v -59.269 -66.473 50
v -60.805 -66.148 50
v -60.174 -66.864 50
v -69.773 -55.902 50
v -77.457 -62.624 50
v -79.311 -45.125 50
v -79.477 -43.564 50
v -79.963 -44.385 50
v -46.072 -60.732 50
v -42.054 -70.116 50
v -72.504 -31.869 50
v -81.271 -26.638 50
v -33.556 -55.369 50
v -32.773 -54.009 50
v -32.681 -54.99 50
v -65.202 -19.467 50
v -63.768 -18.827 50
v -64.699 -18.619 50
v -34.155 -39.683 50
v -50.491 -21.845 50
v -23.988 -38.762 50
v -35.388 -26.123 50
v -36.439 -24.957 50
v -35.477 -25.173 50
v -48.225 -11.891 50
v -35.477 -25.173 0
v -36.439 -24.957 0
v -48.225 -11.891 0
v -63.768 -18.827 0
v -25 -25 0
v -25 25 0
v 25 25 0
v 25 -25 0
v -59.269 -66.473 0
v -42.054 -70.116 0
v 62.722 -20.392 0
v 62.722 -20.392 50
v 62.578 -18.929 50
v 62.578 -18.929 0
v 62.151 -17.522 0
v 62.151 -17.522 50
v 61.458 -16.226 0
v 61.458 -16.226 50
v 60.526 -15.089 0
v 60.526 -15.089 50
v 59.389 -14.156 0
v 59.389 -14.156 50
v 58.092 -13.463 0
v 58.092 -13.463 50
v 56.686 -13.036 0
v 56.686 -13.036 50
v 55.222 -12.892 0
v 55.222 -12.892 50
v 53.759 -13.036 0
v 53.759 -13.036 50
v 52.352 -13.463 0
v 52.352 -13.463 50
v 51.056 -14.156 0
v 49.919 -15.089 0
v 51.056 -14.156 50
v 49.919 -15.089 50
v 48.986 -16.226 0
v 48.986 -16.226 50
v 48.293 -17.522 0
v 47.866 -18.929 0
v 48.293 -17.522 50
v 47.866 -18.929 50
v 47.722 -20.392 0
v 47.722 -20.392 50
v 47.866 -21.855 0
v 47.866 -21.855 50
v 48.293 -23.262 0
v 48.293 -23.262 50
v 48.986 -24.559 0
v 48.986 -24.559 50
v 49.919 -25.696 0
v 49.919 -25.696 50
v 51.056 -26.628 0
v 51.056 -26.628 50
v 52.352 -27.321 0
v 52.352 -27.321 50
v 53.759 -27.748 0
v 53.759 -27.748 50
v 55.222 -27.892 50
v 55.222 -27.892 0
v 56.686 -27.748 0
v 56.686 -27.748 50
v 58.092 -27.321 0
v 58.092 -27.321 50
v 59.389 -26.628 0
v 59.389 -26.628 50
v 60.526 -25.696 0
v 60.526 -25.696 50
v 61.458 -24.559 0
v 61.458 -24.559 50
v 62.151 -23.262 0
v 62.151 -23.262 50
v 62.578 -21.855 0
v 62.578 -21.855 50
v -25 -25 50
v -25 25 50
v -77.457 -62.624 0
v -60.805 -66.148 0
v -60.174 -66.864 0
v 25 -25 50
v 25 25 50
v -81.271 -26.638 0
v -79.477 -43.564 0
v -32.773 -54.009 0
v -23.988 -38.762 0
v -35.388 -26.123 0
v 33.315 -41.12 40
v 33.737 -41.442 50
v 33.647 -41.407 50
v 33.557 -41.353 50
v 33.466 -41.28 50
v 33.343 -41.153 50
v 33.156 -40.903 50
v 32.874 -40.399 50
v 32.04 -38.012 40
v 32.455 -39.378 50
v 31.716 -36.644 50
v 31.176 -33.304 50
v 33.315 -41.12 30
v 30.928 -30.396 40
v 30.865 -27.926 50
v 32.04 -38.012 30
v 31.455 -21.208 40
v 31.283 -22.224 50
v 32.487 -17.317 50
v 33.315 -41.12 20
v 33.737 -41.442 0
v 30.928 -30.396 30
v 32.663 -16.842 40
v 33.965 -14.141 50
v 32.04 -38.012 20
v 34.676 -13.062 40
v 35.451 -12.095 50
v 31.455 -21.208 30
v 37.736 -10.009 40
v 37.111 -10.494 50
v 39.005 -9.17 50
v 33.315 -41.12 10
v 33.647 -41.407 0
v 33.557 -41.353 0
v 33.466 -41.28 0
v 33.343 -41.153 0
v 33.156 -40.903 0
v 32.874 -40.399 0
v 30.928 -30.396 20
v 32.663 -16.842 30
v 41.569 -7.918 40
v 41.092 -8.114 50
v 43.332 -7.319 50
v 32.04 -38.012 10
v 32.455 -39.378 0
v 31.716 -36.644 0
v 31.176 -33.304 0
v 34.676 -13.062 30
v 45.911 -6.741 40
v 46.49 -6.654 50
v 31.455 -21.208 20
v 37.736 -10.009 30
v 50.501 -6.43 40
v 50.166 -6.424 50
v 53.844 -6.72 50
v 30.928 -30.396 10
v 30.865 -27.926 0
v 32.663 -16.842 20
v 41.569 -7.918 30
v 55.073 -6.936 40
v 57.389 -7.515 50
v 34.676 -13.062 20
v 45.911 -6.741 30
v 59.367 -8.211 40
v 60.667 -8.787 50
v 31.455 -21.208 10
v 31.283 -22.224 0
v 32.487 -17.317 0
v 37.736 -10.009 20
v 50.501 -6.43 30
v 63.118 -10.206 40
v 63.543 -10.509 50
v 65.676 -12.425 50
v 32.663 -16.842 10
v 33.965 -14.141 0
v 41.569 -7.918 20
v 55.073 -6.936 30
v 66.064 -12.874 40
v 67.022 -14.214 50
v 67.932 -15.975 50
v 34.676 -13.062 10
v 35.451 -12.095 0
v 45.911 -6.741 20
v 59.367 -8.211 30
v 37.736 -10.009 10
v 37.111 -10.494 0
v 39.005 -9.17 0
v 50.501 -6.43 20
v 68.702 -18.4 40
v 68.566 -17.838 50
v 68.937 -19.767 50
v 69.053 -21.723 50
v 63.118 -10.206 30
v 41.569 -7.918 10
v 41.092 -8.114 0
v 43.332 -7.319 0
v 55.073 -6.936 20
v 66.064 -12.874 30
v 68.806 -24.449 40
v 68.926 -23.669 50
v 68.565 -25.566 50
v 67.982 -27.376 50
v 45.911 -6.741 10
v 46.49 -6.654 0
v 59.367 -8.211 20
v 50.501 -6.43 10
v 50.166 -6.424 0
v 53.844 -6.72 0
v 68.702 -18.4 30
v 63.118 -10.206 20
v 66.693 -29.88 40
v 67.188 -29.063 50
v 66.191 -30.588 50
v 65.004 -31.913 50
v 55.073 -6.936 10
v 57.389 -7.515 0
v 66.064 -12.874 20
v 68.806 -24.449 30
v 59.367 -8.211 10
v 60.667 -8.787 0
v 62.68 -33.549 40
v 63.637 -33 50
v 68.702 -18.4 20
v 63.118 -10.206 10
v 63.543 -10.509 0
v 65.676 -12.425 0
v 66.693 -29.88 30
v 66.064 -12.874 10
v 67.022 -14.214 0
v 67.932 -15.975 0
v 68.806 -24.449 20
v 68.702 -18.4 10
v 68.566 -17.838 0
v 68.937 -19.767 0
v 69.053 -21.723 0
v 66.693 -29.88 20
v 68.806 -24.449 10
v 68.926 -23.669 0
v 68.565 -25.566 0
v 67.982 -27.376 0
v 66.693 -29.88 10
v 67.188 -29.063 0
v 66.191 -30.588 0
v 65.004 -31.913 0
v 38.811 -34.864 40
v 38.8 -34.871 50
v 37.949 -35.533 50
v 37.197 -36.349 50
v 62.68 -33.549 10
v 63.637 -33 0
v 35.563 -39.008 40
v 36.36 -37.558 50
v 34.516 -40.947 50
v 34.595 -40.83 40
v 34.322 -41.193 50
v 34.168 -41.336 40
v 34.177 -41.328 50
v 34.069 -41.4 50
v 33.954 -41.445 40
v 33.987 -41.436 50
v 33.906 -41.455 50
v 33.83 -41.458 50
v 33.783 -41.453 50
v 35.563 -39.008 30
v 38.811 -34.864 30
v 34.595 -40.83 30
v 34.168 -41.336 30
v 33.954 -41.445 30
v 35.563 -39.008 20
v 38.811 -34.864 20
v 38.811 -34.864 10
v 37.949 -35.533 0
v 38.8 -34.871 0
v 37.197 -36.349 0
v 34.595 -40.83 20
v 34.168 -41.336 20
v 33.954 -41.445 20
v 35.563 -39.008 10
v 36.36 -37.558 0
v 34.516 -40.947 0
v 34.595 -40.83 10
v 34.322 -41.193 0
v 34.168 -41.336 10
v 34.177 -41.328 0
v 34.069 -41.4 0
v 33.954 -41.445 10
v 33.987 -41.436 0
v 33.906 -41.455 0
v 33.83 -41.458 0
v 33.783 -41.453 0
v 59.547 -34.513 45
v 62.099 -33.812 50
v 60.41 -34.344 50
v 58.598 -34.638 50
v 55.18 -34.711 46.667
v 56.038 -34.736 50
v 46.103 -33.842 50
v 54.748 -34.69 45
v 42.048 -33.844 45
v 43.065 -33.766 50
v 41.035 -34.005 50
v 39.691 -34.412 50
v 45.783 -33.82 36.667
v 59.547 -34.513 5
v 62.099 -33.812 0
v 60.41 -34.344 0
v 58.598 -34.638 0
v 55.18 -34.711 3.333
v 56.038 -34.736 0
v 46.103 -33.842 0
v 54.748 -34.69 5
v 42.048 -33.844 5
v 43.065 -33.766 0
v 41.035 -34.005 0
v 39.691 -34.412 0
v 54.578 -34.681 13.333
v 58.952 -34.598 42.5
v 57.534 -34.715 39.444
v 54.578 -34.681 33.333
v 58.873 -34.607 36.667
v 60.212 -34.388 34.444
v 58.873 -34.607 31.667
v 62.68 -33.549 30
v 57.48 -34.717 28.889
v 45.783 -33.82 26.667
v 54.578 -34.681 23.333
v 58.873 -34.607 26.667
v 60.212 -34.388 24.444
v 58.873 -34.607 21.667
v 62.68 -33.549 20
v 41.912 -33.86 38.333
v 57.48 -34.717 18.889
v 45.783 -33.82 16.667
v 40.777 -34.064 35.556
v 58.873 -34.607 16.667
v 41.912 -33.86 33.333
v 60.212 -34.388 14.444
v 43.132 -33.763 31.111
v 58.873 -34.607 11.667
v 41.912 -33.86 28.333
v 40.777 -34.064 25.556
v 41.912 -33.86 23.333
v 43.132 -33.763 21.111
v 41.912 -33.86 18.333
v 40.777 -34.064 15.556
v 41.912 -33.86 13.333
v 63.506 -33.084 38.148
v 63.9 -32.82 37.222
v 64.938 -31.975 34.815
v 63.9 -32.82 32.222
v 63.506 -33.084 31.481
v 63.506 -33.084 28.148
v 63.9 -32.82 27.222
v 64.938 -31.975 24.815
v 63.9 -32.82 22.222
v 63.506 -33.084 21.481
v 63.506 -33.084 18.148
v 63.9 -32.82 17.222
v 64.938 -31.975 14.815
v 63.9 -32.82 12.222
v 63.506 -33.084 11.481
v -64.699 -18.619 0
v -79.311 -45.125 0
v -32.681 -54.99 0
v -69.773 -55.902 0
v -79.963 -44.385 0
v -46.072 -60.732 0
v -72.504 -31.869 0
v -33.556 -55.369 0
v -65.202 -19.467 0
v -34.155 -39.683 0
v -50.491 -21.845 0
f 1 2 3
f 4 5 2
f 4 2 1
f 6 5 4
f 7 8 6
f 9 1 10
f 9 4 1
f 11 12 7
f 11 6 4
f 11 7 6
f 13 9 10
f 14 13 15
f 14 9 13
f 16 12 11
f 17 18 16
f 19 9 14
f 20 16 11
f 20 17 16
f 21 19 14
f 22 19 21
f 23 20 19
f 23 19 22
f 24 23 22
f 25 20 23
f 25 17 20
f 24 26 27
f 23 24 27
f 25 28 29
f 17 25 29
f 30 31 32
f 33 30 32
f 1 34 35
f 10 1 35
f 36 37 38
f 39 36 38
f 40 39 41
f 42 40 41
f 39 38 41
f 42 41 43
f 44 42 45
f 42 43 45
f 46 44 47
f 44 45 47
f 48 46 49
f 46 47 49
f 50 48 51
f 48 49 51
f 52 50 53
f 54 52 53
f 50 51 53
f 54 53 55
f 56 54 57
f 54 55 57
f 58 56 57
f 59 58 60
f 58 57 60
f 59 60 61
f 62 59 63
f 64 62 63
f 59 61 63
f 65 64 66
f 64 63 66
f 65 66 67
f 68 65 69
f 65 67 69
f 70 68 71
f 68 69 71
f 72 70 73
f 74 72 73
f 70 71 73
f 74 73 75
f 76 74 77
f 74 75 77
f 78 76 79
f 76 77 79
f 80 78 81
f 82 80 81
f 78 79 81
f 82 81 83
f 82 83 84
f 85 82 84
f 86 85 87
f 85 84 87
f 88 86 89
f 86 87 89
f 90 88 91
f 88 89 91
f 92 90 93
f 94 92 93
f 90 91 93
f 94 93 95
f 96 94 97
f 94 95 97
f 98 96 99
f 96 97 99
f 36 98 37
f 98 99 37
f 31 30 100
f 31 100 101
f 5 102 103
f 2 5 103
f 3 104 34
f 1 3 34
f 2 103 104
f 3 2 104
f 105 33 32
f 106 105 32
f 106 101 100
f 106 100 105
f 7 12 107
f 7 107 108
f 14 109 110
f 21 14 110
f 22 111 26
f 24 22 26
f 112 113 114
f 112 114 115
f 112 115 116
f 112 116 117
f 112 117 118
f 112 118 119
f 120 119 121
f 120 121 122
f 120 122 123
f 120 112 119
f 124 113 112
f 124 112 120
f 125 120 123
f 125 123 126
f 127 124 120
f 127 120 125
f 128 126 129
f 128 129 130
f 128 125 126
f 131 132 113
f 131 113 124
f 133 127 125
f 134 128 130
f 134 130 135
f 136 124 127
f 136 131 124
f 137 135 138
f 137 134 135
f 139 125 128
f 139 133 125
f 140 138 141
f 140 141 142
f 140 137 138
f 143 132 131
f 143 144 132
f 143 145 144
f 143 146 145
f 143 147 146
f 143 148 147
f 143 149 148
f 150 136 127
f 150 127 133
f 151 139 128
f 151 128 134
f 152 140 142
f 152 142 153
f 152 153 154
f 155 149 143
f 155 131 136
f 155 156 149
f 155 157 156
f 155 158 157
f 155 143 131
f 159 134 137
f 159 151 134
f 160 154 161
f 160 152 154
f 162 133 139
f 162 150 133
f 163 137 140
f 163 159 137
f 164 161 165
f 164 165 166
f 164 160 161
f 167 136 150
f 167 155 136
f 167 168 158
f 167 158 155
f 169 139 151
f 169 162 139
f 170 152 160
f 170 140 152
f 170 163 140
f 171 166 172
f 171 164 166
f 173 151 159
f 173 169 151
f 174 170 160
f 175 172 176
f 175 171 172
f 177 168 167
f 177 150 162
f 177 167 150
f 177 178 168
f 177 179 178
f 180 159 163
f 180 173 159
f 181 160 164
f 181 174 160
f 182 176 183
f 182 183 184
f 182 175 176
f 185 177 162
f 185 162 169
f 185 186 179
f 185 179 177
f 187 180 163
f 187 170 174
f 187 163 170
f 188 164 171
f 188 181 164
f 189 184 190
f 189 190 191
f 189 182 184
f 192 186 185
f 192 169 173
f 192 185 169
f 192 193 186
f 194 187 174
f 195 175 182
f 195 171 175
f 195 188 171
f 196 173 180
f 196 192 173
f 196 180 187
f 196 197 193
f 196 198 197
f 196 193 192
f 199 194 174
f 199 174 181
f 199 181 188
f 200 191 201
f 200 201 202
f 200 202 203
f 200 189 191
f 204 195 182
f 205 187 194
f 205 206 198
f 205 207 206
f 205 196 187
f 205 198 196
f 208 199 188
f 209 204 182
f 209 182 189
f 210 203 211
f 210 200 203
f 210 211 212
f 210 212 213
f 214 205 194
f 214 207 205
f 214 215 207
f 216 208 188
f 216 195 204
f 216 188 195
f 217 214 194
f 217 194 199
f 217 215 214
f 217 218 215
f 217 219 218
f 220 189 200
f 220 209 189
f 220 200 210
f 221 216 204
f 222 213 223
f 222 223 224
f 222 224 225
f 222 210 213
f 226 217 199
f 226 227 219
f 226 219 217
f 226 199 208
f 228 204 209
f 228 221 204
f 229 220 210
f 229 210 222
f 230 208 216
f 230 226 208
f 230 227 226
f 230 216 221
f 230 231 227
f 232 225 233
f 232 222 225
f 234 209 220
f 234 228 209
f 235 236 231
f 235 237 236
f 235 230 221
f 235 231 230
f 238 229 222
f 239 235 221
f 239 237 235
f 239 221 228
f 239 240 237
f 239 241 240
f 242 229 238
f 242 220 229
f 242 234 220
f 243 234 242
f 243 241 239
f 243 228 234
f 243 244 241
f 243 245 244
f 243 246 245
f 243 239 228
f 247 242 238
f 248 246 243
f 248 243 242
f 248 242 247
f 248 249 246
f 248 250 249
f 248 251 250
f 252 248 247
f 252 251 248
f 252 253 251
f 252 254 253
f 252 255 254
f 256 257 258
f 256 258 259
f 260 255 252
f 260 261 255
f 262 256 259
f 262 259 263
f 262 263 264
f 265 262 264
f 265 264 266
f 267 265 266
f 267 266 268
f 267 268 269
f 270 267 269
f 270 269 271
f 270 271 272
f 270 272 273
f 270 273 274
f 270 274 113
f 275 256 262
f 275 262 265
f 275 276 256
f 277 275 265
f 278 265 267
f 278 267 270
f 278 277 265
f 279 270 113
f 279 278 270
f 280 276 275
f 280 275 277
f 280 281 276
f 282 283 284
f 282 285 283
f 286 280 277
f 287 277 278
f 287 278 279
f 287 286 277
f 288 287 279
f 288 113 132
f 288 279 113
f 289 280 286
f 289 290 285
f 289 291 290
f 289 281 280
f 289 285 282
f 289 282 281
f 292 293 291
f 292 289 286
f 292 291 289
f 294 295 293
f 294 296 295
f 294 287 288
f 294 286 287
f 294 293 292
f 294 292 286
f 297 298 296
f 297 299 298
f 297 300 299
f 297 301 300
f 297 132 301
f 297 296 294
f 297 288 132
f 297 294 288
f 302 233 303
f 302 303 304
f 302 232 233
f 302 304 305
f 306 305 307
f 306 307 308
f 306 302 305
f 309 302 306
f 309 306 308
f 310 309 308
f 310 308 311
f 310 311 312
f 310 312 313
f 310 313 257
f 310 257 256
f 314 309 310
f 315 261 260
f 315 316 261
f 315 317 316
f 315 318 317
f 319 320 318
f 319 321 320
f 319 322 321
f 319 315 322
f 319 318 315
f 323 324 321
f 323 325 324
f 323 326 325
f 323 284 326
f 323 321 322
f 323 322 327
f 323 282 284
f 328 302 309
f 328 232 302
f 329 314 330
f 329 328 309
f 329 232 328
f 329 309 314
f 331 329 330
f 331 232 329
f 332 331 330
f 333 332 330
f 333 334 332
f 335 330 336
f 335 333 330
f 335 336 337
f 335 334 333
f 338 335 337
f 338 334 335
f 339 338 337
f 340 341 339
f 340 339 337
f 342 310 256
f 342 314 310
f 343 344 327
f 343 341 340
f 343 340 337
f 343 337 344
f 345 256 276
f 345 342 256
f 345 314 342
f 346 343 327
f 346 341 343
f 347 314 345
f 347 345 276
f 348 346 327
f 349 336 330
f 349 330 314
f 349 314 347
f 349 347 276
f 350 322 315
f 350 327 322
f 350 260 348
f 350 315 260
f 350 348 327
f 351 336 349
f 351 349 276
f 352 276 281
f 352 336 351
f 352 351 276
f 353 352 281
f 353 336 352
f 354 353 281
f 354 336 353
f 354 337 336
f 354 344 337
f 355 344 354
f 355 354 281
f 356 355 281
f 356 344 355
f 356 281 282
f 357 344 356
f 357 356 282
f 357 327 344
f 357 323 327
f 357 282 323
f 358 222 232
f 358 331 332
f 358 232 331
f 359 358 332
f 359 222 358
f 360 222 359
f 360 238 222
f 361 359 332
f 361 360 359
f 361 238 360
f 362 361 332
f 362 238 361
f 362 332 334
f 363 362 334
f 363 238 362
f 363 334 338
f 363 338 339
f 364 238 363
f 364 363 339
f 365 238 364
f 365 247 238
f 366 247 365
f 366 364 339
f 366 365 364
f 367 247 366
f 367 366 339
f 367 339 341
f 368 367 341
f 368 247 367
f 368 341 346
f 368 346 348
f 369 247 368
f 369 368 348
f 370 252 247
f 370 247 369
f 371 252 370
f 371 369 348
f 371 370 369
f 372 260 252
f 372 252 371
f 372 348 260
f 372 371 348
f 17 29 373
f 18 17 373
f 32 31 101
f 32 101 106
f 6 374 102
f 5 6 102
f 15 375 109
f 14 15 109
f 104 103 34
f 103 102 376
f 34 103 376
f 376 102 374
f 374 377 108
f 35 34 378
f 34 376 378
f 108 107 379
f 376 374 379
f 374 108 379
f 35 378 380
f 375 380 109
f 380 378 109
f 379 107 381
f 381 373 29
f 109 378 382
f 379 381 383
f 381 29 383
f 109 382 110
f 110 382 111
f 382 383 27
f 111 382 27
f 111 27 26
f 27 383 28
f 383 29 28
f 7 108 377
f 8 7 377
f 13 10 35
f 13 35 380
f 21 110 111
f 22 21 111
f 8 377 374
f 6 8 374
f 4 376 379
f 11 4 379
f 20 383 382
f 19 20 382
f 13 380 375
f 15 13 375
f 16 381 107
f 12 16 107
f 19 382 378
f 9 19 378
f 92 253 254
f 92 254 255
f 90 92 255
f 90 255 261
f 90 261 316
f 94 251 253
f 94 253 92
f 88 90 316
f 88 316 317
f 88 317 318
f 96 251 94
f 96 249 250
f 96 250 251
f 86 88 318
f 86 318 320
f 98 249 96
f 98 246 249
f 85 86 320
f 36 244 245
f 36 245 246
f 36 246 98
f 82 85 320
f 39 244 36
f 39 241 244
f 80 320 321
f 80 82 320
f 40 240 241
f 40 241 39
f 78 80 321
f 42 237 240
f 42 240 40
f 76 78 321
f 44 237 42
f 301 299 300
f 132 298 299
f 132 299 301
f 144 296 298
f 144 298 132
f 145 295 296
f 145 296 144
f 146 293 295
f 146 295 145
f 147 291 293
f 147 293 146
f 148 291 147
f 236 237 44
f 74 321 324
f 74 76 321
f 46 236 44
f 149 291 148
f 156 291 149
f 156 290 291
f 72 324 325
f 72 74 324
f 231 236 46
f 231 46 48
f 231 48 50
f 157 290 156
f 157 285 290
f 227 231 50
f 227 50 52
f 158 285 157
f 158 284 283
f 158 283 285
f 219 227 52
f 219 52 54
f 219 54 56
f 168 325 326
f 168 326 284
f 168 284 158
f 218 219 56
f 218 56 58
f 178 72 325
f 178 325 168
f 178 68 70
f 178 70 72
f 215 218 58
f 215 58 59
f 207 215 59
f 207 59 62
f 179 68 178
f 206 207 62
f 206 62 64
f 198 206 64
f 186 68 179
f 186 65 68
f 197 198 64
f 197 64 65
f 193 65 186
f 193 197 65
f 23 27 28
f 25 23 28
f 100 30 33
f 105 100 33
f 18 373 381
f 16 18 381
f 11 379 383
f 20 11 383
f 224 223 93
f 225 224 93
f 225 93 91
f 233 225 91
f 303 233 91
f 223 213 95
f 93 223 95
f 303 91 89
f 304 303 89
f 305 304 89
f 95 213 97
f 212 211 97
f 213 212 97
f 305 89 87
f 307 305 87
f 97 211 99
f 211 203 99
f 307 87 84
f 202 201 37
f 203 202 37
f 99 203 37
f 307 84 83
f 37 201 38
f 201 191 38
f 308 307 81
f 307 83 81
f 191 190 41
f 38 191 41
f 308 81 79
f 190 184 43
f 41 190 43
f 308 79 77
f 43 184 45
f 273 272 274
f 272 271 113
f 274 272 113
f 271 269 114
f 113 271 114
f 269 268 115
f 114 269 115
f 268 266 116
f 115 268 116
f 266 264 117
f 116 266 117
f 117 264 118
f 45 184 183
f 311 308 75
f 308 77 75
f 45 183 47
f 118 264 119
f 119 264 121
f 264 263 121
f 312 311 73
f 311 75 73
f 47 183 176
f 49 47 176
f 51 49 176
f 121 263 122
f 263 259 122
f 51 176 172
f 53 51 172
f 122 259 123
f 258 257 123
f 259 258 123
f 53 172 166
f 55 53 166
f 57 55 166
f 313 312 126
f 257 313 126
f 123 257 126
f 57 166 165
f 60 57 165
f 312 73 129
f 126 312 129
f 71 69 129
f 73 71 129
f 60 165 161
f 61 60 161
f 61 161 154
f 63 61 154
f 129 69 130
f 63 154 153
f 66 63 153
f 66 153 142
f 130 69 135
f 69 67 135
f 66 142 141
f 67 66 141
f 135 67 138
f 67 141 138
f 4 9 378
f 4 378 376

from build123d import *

# Parameters (mm, degrees)
F0_W     = 50
F0_H     = 50
F1_DEPTH = 50
F3_DEPTH = 50
F4_R     = 7.5
F5_DEPTH = 50


with BuildPart() as f1:
    # F0 (on Top) → F1 (new body)
    with BuildSketch(Plane.XY):
        Rectangle(F0_W, F0_H)
    extrude(amount=F1_DEPTH)


with BuildPart() as f3:
    # F2 (on Top) → F3 (new body)
    with BuildSketch(Plane.XY):
        with BuildLine():
            add(Edge.make_bspline(
                [(33.7365791202, -41.4424240589), (31.5524814258, -40.8217800872), (24.5054708689, -2.3488587323), (74.1751913533, -5.9759045351), (66.7450784353, -42.0413593704), (37.1163288643, -28.3775692794), (34.9179756672, -41.7781355278), (33.7365791202, -41.4424240589)],
                knots=[0, 0, 0, 0, 0.2288987477, 0.4695555389, 0.6661636185, 0.87618677, 1, 1, 1, 1], degree=3))
        make_face()
    extrude(amount=F3_DEPTH)

    # F4 (on face) → F5 (cut)
    with BuildSketch(Plane.XY.offset(50)):
        with Locations((55.2223548293, -20.3923042864)):
            Circle(F4_R)
    extrude(amount=-F5_DEPTH, mode=Mode.SUBTRACT)


with BuildPart() as f3b:
    # F2 (on Top) → F3, piece 2 (new body)
    with BuildSketch(Plane.XY):
        Polygon((-65.2016947436, -19.4671313755), (-81.2706886919, -26.6384186489), (-79.4766781793, -43.5643350799), align=None)
        Polygon((-64.6990569833, -18.6186425101), (-65.2016947436, -19.4671313755), (-63.7682640314, -18.8274184317), align=None)
        Polygon((-35.4769644734, -25.1731284249), (-36.4392489478, -24.9572889866), (-35.3878913336, -26.122880435), align=None)
        Polygon((-23.9877022811, -38.7617415513), (-35.3878913336, -26.122880435), (-32.7726145686, -54.008552489), align=None)
        Polygon((-32.6805278169, -54.9904374634), (-32.7726145686, -54.008552489), (-33.5562705409, -55.3686405649), align=None)
        Polygon((-33.5562705409, -55.3686405649), (-59.2689556938, -66.4730631384), (-42.0536896079, -70.1164875248), align=None)
        Polygon((-59.2689556938, -66.4730631384), (-60.8046393343, -66.1480523487), (-60.1743274257, -66.8640619874), align=None)
        Polygon((-60.8046393343, -66.1480523487), (-79.3112294658, -45.1252908706), (-77.4565221868, -62.6238619145), align=None)
        Polygon((-79.3112294658, -45.1252908706), (-79.4766781793, -43.5643350799), (-79.9628667204, -44.3850564744), align=None)
        Polygon((-63.7682640314, -18.8274184317), (-65.2016947436, -19.4671313755), (-79.4766781793, -43.5643350799), (-79.3112294658, -45.1252908706), (-60.8046393343, -66.1480523487), (-59.2689556938, -66.4730631384), (-33.5562705409, -55.3686405649), (-32.7726145686, -54.008552489), (-35.3878913336, -26.122880435), (-36.4392489478, -24.9572889866), align=None)
        Polygon((-46.0718111319, -60.7315766554), (-69.7726093861, -55.9023043065), (-72.5036478905, -31.8691784592), (-50.4907242566, -21.8451621785), (-34.1549507547, -39.6831052606), align=None, mode=Mode.SUBTRACT)
        Polygon((-48.2251406519, -11.8908172208), (-63.7682640314, -18.8274184317), (-36.4392489478, -24.9572889866), align=None)
    extrude(amount=F3_DEPTH)


solid = Compound([f1.part, f3.part, f3b.part])
